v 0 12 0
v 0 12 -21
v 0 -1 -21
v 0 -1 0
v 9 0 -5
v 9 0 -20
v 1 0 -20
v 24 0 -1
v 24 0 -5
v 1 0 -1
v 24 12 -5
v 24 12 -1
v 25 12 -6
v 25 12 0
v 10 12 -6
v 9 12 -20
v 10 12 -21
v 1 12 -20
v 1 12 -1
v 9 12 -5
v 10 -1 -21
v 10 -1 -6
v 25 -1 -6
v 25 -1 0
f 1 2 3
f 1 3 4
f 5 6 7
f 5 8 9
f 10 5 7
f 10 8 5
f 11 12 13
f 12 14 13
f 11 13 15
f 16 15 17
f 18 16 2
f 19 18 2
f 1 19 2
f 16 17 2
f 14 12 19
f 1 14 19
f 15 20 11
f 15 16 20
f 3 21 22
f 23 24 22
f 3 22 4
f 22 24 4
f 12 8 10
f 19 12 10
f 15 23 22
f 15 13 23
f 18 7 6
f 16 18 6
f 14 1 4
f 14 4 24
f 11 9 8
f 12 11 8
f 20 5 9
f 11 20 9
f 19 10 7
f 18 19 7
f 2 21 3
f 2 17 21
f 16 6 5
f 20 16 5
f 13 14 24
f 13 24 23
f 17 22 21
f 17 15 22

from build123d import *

# Parameters (mm, degrees)
EXTRUDE_1_DEPTH = 12
EXTRUDE_2_DEPTH = 1


with BuildPart() as part:
    # 草图1 → 凸台-拉伸1 (new body)
    with BuildSketch(Plane(origin=(0, 0, 0), x_dir=(1, 0, 0), z_dir=(0, 1, 0))):
        Polygon((0, 0), (0, 21), (10, 21), (10, 6), (25, 6), (25, 0), align=None)
        Polygon((1, 20), (9, 20), (9, 5), (24, 5), (24, 1), (1, 1), align=None, mode=Mode.SUBTRACT)
    extrude(amount=EXTRUDE_1_DEPTH)

    # 草图3 → 凸台-拉伸2 (add)
    with BuildSketch(Plane.XZ):
        Polygon((10, -21), (0, -21), (0, 0), (25, 0), (25, -6), (10, -6), align=None)
    extrude(amount=EXTRUDE_2_DEPTH)


solid = part.part
